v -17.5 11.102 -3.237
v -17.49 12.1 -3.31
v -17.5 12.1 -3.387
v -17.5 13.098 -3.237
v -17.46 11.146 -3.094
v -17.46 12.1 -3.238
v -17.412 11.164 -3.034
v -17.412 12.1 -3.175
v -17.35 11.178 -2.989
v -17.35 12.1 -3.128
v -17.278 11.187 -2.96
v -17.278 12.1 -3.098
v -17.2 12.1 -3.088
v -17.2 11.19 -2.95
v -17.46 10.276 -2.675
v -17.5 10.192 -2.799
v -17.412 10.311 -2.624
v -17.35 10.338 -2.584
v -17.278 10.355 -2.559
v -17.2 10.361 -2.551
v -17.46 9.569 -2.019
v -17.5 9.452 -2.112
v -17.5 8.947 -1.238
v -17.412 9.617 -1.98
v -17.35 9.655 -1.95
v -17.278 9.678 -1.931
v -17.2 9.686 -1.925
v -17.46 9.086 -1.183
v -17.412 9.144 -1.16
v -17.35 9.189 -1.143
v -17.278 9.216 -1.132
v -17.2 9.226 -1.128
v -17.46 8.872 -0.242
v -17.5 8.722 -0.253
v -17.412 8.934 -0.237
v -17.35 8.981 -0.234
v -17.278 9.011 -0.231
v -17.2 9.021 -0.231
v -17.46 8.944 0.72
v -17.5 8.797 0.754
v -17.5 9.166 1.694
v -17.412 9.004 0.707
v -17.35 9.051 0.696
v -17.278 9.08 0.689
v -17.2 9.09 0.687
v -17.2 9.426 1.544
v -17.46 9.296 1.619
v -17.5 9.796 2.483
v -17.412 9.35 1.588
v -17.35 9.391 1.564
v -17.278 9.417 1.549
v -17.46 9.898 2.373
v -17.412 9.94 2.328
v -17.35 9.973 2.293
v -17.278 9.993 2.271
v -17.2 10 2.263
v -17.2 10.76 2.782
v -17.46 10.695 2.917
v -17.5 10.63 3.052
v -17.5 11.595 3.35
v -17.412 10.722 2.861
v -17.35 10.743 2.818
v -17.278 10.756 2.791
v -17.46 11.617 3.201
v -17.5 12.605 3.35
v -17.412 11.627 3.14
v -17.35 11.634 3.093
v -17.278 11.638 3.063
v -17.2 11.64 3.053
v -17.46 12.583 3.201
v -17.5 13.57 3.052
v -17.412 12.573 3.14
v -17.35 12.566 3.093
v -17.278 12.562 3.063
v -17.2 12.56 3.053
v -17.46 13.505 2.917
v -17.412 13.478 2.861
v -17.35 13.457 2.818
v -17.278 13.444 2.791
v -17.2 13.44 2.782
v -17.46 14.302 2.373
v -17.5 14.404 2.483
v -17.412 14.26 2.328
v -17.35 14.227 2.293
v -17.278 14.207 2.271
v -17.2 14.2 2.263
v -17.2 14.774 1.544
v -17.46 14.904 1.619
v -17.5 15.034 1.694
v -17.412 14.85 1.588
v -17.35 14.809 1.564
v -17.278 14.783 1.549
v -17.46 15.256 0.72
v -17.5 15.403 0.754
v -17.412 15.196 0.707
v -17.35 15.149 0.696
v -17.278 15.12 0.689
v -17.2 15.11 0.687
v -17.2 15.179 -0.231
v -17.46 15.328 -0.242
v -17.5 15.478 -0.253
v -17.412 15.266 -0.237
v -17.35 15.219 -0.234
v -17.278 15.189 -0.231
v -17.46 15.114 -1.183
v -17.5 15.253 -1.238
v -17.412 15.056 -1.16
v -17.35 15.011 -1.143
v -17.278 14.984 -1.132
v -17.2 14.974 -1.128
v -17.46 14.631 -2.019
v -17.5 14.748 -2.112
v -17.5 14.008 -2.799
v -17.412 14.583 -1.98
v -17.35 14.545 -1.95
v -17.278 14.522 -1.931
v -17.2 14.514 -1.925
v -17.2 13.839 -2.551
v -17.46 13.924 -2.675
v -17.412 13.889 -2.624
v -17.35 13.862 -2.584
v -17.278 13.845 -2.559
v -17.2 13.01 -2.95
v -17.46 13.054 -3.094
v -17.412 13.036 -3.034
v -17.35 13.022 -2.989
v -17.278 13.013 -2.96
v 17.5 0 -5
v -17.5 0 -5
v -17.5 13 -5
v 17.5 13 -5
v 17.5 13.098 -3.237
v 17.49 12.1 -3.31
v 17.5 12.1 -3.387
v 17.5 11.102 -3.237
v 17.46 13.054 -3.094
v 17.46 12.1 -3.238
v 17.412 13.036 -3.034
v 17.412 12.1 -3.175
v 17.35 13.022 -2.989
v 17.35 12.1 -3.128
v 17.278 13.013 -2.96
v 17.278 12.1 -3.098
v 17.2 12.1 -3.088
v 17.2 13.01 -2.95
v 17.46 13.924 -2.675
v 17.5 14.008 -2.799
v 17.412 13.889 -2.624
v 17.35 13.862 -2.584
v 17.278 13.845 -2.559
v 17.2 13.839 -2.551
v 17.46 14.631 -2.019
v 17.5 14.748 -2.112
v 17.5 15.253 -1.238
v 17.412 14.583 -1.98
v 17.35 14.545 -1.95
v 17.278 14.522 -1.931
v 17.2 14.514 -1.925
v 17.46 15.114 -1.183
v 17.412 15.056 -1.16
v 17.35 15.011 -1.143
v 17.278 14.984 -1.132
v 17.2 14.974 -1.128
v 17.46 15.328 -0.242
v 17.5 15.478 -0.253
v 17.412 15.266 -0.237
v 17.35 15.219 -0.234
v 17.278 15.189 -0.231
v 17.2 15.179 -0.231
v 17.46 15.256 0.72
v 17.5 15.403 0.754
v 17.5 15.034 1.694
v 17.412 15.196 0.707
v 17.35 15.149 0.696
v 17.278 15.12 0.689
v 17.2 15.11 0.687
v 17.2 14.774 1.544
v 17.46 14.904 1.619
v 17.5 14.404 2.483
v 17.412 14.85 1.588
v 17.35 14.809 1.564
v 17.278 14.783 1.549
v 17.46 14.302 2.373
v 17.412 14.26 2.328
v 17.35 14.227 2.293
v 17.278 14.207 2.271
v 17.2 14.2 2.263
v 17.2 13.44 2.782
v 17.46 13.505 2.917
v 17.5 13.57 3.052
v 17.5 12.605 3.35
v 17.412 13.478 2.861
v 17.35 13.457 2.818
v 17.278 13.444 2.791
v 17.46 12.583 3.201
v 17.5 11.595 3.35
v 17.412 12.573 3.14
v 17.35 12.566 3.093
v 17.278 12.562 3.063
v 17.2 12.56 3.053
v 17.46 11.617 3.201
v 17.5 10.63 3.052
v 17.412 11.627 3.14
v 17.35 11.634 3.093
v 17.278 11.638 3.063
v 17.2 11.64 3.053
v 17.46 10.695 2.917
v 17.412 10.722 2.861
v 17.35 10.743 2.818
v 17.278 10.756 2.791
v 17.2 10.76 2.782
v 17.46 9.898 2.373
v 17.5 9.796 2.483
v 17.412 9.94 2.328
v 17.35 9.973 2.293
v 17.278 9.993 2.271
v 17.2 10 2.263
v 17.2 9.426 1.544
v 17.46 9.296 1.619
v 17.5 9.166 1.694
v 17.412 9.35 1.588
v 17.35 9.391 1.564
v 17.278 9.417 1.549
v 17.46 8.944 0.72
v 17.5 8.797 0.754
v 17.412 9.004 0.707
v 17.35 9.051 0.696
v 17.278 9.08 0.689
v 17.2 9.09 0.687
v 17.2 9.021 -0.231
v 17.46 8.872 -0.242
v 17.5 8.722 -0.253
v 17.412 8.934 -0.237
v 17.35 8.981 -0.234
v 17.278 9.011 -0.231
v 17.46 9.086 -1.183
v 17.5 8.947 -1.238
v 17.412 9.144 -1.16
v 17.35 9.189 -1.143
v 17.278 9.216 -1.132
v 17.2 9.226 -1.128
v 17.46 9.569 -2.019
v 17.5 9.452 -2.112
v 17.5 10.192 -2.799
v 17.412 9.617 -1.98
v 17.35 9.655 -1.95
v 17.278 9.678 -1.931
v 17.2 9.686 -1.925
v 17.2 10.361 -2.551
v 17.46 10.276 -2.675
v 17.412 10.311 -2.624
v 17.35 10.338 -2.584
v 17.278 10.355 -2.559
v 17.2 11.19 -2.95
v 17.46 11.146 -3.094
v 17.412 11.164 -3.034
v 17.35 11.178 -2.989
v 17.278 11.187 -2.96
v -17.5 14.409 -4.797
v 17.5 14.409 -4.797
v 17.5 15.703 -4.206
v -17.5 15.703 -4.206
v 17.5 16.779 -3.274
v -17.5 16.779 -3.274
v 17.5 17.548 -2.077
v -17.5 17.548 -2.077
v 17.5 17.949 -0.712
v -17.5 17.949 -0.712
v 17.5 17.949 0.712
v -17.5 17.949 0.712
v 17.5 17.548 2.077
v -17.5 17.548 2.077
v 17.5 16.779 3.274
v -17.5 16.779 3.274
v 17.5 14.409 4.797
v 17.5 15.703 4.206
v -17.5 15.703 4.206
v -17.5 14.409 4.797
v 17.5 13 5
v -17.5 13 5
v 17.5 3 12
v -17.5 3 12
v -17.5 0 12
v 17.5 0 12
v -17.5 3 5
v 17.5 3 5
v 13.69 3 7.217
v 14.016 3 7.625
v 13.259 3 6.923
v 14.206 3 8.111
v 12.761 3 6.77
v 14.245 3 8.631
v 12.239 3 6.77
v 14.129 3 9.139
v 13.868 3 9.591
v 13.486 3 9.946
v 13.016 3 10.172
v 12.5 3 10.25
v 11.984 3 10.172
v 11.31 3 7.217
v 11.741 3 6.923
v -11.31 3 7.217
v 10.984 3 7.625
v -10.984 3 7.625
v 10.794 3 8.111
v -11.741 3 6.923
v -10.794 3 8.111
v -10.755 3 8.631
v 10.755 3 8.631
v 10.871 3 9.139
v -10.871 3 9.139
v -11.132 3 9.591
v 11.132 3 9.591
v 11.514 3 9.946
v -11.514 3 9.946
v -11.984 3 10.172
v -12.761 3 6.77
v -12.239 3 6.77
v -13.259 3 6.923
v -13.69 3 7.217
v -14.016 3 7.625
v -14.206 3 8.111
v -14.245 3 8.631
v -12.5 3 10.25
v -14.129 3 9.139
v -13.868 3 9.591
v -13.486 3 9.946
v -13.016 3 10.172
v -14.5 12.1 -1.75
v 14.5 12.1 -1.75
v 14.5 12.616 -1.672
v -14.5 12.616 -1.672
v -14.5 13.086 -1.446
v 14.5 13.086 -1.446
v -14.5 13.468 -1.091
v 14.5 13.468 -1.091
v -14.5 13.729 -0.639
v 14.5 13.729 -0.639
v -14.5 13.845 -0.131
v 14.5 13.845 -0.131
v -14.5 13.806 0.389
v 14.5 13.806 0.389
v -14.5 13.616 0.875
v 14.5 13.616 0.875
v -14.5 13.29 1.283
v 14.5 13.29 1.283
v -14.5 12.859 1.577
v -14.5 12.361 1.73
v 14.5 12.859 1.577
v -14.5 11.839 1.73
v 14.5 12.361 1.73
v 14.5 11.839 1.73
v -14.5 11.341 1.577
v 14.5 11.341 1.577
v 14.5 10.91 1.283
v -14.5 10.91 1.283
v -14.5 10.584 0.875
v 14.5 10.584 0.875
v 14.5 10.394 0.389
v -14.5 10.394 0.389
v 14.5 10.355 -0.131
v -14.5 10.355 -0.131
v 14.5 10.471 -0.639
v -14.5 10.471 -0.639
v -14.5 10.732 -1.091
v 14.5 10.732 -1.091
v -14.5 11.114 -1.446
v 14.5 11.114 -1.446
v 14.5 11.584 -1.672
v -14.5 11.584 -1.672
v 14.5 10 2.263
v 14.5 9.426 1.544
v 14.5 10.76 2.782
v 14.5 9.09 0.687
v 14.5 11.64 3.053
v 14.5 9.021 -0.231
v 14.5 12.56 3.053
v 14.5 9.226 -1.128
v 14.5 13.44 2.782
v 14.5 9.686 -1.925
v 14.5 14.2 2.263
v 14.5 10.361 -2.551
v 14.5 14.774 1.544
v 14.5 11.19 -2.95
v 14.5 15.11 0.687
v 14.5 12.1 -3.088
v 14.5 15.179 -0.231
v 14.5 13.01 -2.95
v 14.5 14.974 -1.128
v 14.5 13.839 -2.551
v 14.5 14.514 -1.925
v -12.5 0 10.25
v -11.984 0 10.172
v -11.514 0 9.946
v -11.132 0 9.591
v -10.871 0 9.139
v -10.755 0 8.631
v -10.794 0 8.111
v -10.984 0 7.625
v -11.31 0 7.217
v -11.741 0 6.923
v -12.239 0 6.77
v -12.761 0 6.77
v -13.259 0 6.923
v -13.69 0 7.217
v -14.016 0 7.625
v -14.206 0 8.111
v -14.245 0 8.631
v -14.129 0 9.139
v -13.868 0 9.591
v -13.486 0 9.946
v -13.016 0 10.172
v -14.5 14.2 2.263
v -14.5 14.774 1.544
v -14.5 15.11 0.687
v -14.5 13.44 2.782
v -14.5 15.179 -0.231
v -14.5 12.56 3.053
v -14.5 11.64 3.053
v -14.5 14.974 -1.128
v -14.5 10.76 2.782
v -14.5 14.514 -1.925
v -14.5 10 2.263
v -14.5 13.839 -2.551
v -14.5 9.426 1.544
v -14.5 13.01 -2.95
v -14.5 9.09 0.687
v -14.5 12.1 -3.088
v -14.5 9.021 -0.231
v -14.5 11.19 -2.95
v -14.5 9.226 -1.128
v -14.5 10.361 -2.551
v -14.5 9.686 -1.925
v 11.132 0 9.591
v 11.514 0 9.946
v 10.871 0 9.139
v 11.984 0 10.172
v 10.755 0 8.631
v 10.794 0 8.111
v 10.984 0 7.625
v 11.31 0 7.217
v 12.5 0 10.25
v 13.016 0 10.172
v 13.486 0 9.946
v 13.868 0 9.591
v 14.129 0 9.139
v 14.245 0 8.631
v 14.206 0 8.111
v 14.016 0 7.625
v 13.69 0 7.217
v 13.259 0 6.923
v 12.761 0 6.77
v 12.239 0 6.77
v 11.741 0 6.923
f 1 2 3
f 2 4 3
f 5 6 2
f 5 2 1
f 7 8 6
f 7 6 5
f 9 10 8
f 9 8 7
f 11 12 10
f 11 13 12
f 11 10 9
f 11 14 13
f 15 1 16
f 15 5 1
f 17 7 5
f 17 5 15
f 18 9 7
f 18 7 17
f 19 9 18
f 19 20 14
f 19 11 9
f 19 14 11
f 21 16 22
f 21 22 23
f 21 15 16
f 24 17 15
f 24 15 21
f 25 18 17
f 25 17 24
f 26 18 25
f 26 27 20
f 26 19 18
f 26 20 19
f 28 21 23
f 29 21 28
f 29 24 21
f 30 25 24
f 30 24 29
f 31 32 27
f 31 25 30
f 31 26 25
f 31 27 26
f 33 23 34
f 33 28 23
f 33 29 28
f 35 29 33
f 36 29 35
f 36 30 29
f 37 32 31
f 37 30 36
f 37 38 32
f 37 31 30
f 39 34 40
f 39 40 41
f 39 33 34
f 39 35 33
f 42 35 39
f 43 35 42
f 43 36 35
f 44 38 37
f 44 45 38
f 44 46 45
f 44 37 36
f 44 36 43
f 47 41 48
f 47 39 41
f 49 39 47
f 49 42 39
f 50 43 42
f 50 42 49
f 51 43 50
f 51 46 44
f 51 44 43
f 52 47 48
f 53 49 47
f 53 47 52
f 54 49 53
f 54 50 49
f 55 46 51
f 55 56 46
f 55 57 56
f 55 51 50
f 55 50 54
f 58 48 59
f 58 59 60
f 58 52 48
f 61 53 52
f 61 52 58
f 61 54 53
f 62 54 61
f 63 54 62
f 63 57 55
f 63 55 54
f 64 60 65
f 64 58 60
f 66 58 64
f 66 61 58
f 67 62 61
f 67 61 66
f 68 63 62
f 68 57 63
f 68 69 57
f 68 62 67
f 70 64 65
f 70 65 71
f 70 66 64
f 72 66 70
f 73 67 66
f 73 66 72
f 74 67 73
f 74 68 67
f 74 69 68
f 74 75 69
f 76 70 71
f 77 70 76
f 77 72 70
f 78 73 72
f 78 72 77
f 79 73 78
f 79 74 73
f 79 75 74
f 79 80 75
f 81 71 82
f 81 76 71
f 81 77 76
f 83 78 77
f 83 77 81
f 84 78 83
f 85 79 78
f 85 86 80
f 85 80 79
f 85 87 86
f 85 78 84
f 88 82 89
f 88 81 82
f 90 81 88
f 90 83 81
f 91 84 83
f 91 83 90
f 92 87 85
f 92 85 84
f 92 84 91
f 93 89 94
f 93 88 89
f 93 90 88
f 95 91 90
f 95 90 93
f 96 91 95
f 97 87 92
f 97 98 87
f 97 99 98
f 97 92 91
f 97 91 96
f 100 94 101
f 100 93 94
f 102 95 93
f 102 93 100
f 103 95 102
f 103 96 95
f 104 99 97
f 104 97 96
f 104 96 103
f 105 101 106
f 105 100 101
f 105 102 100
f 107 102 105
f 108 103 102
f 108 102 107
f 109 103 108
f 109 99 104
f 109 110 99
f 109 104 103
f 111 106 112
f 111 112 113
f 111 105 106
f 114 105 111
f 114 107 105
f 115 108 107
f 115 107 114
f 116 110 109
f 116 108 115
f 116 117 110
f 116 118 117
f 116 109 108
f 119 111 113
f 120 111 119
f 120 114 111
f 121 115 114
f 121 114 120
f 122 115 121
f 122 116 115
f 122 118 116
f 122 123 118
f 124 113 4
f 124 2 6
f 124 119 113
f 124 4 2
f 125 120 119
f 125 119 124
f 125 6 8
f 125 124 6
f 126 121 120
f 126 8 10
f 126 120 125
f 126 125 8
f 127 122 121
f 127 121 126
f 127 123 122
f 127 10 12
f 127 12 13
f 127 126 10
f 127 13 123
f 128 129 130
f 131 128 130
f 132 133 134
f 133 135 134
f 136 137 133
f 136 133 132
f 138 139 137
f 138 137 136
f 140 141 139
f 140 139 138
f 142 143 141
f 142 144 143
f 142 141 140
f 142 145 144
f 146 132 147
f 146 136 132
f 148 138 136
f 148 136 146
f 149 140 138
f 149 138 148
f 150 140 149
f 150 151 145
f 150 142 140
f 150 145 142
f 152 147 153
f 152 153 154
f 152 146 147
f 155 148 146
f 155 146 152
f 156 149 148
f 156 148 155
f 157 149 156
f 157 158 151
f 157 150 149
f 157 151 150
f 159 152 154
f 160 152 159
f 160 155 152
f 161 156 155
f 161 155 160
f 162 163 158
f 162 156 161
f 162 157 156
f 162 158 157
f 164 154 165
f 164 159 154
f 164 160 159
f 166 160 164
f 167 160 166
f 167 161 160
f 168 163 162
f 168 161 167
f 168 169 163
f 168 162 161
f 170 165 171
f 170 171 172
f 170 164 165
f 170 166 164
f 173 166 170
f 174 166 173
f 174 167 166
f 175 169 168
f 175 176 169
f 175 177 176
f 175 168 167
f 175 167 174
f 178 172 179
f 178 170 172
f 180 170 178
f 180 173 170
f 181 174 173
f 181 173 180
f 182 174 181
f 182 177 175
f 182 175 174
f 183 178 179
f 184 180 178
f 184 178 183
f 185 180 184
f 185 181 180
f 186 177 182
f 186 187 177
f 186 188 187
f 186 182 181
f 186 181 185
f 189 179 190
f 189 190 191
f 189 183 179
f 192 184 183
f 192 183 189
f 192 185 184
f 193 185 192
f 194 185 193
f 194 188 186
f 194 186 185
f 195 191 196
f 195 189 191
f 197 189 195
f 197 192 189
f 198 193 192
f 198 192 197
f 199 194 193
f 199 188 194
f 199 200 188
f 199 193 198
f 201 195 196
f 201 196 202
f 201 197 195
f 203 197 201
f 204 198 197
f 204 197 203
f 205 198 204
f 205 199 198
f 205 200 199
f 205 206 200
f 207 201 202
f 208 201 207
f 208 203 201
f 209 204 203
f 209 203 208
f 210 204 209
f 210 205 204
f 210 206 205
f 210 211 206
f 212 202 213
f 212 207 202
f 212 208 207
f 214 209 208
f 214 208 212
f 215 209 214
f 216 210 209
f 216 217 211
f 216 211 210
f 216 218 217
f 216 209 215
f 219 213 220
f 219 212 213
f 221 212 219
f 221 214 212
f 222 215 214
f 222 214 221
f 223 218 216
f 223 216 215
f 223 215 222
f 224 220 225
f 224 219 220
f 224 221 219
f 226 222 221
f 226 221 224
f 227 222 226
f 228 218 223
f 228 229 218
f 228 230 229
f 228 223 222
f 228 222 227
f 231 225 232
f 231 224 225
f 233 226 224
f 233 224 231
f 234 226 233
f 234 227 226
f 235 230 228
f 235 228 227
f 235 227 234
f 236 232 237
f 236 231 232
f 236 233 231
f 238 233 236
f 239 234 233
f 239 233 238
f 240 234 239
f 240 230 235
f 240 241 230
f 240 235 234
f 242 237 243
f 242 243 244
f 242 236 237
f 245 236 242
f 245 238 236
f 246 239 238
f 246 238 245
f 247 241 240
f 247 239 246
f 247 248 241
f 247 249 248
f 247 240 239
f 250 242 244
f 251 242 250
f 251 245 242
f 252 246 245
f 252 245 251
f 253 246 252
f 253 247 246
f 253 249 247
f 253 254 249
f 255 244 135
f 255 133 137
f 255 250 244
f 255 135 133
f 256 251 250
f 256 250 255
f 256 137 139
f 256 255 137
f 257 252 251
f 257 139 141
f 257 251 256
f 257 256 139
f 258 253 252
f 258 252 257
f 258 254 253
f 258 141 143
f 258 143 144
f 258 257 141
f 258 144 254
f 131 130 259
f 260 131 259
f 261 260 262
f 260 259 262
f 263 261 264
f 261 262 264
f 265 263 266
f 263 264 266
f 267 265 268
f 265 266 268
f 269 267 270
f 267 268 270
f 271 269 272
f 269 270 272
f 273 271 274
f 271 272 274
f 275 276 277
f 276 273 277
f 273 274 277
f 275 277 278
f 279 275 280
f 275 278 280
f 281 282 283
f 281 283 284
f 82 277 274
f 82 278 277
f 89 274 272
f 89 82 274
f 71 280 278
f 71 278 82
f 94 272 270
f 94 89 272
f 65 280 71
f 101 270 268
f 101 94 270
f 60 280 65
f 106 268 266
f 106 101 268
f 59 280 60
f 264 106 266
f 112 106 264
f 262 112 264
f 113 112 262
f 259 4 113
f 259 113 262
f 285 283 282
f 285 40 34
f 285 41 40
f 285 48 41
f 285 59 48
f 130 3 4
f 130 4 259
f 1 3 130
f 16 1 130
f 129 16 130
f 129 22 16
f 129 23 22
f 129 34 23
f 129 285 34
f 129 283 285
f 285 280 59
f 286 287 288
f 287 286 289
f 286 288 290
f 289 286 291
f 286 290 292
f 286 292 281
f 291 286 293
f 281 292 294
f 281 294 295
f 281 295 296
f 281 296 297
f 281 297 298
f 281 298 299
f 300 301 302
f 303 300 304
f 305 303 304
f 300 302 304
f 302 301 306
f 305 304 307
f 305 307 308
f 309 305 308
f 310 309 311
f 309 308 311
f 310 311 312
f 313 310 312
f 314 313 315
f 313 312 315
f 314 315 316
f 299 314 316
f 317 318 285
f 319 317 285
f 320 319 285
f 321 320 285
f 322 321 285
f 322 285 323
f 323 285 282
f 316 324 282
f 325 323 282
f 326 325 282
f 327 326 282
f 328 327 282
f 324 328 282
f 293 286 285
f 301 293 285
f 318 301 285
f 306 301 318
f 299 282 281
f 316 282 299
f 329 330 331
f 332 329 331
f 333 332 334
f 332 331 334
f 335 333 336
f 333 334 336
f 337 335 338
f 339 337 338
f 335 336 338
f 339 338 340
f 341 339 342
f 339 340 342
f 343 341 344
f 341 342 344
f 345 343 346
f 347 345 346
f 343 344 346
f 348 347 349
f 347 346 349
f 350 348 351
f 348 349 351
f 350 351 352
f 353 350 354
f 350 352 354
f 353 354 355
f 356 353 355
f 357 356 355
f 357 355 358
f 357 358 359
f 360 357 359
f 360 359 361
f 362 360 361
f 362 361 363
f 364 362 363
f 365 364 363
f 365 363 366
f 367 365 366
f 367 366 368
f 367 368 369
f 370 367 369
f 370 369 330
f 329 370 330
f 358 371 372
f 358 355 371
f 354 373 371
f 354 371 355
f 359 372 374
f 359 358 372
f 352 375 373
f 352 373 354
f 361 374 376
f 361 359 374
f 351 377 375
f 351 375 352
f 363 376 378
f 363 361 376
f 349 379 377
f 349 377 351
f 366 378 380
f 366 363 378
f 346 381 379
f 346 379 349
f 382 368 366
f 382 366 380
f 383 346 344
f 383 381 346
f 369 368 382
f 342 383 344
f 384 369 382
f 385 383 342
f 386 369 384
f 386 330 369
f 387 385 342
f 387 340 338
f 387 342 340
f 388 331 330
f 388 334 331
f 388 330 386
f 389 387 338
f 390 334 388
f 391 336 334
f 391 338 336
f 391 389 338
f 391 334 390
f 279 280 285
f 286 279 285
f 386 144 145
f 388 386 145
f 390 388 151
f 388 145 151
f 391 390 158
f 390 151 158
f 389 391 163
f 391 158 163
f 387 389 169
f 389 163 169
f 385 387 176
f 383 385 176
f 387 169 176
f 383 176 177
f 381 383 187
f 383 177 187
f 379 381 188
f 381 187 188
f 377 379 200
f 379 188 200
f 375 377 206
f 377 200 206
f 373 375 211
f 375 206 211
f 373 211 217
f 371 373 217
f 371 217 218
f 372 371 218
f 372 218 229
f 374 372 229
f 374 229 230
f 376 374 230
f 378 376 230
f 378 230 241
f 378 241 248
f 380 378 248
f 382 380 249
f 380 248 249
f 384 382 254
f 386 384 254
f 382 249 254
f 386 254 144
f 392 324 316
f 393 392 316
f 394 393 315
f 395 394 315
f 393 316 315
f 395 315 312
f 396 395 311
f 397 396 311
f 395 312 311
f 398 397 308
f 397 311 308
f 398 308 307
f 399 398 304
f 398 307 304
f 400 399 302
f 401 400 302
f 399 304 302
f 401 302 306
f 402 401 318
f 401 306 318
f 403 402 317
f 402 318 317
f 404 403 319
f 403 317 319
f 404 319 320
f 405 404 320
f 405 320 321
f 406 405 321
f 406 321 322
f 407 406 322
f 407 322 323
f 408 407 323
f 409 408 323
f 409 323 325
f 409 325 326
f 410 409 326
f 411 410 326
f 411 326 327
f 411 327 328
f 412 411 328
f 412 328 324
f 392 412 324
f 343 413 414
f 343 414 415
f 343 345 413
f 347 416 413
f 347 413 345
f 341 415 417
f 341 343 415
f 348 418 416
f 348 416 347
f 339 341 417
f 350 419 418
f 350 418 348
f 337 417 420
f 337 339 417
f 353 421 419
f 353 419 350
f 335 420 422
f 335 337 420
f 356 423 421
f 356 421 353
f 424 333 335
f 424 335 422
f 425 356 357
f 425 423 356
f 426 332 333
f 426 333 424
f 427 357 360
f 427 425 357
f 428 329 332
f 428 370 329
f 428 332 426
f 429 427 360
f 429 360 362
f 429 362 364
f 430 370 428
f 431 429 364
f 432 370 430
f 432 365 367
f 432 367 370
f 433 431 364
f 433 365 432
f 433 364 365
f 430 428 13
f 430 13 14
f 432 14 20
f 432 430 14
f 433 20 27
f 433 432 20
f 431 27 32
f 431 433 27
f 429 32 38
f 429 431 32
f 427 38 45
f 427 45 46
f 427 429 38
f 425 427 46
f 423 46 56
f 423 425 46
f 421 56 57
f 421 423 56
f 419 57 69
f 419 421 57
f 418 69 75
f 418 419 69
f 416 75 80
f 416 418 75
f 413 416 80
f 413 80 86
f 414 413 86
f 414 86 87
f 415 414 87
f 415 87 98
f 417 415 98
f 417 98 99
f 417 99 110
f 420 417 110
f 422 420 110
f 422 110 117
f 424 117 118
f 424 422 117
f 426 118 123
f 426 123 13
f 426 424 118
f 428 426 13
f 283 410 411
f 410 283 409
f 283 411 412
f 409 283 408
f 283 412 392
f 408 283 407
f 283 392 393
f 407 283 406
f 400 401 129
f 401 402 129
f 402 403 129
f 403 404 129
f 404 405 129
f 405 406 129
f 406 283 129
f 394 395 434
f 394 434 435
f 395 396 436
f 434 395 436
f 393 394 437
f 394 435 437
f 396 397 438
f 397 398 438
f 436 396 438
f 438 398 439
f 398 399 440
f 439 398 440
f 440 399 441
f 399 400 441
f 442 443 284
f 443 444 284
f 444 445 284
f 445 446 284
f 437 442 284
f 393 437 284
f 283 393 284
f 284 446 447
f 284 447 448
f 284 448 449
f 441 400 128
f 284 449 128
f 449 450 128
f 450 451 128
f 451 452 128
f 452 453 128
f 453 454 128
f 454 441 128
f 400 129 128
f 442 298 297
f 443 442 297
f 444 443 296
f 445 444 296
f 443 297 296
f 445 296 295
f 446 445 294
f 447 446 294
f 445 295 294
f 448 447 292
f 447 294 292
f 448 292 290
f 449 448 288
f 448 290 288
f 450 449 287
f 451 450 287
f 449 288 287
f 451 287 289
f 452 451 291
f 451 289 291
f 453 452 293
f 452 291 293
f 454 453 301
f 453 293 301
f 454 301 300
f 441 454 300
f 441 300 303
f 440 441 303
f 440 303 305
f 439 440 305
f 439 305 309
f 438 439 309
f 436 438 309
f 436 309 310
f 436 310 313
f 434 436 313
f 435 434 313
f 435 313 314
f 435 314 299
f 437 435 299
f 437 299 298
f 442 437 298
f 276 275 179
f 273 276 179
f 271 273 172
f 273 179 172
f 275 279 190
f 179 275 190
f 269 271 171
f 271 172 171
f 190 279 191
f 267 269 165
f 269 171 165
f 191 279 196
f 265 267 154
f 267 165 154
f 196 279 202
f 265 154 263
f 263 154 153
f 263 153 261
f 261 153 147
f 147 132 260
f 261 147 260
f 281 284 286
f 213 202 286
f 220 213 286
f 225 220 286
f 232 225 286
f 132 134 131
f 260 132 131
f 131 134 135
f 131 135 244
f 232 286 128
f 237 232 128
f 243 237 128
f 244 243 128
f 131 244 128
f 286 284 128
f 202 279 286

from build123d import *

# Parameters (mm, degrees)
SKETCH1_W           = 35
SKETCH1_H           = 30
BOSS_EXTRUDE1_DEPTH = 22.1
SKETCH2_R           = 3.0875
CUT_EXTRUDE1_DEPTH  = 3
SKETCH3_R           = 1.75
CUT_EXTRUDE2_DEPTH  = 42.682250419
CUT_EXTRUDE3_START  = -3
SKETCH4_R           = 3.0875
CUT_EXTRUDE3_DEPTH  = 3
SKETCH5_R           = 1.75
CUT_EXTRUDE4_DEPTH  = 32.932115495
CUT_EXTRUDE5_DEPTH  = 45.027377846
FILLET1_R           = 0.3
SKETCH7_W           = 35
SKETCH7_H           = 3
CUT_EXTRUDE6_DEPTH  = 10


with BuildPart() as part:
    # Sketch1 → Boss-Extrude1 (new body)
    with BuildSketch(Plane(origin=(0, 0, 0), x_dir=(1, 0, 0), z_dir=(0, 1, 0))):
        Rectangle(SKETCH1_W, SKETCH1_H)
    extrude(amount=BOSS_EXTRUDE1_DEPTH)

    # Sketch2 → Cut-Extrude1 (cut)
    with BuildSketch(Plane(origin=(17.5, 0, 0), x_dir=(0, 0, -1), z_dir=(1, 0, 0))):
        with Locations((0, 12.1)):
            Circle(SKETCH2_R)
    extrude(amount=-CUT_EXTRUDE1_DEPTH, mode=Mode.SUBTRACT)

    # Sketch3 → Cut-Extrude2 (cut, through all)
    with BuildSketch(Plane(origin=(14.5, 0, 0), x_dir=(0, 0, -1), z_dir=(1, 0, 0))):
        with Locations((0, 12.1)):
            Circle(SKETCH3_R)
    extrude(amount=-CUT_EXTRUDE2_DEPTH, mode=Mode.SUBTRACT)

    # Sketch4 → Cut-Extrude3 (cut)
    with BuildSketch(Plane.ZY.offset(17.5).offset(CUT_EXTRUDE3_START)):
        with Locations(Location((0, 12.1, 0), (0, 0, 180))):
            Circle(SKETCH4_R)
    extrude(amount=CUT_EXTRUDE3_DEPTH, mode=Mode.SUBTRACT)

    # Sketch5 → Cut-Extrude4 (cut, through all)
    with BuildSketch(Plane(origin=(0, 22.1, 0), x_dir=(1, 0, 0), z_dir=(0, 1, 0))):
        with Locations(Location((-12.5, 8.5, 0), (0, 0, 270))):
            Circle(SKETCH5_R)
        with Locations(Location((12.5, 8.5, 0), (0, 0, 270))):
            Circle(SKETCH5_R)
        with Locations(Location((12.5, -8.5, 0), (0, 0, 270))):
            Circle(SKETCH5_R)
        with Locations(Location((-12.5, -8.5, 0), (0, 0, 270))):
            Circle(SKETCH5_R)
    extrude(amount=-CUT_EXTRUDE4_DEPTH, mode=Mode.SUBTRACT)

    # Sketch6 → Cut-Extrude5 (cut, through all)
    with BuildSketch(Plane.ZY.offset(17.5)):
        with BuildLine():
            Line((-5, 3), (-5, 13))
            ThreePointArc((-5, 13), (0, 18), (5, 13))
            Line((5, 13), (5, 3))
            Line((5, 3), (15, 3))
            Line((15, 3), (15, 22.1))
            Line((15, 22.1), (-15, 22.1))
            Line((-15, 22.1), (-15, 3))
            Line((-15, 3), (-15, 0))
            Line((-15, 0), (-5, 0))
            Line((-5, 0), (-5, 3))
        make_face()
    extrude(amount=-CUT_EXTRUDE5_DEPTH, mode=Mode.SUBTRACT)

    # Fillet1
    fillet1_edges = [part.edges().sort_by_distance(p)[0] for p in [
        (17.5, 12.1, 3.0875),
        (-17.5, 12.1, 3.0875),
    ]]
    fillet(fillet1_edges, radius=FILLET1_R)

    # Sketch7 → Cut-Extrude6 (cut)
    with BuildSketch(Plane(origin=(0, 3, 0), x_dir=(1, 0, 0), z_dir=(0, 1, 0))):
        with Locations((0, -13.5)):
            Rectangle(SKETCH7_W, SKETCH7_H)
    extrude(amount=-CUT_EXTRUDE6_DEPTH, mode=Mode.SUBTRACT)


solid = part.part
